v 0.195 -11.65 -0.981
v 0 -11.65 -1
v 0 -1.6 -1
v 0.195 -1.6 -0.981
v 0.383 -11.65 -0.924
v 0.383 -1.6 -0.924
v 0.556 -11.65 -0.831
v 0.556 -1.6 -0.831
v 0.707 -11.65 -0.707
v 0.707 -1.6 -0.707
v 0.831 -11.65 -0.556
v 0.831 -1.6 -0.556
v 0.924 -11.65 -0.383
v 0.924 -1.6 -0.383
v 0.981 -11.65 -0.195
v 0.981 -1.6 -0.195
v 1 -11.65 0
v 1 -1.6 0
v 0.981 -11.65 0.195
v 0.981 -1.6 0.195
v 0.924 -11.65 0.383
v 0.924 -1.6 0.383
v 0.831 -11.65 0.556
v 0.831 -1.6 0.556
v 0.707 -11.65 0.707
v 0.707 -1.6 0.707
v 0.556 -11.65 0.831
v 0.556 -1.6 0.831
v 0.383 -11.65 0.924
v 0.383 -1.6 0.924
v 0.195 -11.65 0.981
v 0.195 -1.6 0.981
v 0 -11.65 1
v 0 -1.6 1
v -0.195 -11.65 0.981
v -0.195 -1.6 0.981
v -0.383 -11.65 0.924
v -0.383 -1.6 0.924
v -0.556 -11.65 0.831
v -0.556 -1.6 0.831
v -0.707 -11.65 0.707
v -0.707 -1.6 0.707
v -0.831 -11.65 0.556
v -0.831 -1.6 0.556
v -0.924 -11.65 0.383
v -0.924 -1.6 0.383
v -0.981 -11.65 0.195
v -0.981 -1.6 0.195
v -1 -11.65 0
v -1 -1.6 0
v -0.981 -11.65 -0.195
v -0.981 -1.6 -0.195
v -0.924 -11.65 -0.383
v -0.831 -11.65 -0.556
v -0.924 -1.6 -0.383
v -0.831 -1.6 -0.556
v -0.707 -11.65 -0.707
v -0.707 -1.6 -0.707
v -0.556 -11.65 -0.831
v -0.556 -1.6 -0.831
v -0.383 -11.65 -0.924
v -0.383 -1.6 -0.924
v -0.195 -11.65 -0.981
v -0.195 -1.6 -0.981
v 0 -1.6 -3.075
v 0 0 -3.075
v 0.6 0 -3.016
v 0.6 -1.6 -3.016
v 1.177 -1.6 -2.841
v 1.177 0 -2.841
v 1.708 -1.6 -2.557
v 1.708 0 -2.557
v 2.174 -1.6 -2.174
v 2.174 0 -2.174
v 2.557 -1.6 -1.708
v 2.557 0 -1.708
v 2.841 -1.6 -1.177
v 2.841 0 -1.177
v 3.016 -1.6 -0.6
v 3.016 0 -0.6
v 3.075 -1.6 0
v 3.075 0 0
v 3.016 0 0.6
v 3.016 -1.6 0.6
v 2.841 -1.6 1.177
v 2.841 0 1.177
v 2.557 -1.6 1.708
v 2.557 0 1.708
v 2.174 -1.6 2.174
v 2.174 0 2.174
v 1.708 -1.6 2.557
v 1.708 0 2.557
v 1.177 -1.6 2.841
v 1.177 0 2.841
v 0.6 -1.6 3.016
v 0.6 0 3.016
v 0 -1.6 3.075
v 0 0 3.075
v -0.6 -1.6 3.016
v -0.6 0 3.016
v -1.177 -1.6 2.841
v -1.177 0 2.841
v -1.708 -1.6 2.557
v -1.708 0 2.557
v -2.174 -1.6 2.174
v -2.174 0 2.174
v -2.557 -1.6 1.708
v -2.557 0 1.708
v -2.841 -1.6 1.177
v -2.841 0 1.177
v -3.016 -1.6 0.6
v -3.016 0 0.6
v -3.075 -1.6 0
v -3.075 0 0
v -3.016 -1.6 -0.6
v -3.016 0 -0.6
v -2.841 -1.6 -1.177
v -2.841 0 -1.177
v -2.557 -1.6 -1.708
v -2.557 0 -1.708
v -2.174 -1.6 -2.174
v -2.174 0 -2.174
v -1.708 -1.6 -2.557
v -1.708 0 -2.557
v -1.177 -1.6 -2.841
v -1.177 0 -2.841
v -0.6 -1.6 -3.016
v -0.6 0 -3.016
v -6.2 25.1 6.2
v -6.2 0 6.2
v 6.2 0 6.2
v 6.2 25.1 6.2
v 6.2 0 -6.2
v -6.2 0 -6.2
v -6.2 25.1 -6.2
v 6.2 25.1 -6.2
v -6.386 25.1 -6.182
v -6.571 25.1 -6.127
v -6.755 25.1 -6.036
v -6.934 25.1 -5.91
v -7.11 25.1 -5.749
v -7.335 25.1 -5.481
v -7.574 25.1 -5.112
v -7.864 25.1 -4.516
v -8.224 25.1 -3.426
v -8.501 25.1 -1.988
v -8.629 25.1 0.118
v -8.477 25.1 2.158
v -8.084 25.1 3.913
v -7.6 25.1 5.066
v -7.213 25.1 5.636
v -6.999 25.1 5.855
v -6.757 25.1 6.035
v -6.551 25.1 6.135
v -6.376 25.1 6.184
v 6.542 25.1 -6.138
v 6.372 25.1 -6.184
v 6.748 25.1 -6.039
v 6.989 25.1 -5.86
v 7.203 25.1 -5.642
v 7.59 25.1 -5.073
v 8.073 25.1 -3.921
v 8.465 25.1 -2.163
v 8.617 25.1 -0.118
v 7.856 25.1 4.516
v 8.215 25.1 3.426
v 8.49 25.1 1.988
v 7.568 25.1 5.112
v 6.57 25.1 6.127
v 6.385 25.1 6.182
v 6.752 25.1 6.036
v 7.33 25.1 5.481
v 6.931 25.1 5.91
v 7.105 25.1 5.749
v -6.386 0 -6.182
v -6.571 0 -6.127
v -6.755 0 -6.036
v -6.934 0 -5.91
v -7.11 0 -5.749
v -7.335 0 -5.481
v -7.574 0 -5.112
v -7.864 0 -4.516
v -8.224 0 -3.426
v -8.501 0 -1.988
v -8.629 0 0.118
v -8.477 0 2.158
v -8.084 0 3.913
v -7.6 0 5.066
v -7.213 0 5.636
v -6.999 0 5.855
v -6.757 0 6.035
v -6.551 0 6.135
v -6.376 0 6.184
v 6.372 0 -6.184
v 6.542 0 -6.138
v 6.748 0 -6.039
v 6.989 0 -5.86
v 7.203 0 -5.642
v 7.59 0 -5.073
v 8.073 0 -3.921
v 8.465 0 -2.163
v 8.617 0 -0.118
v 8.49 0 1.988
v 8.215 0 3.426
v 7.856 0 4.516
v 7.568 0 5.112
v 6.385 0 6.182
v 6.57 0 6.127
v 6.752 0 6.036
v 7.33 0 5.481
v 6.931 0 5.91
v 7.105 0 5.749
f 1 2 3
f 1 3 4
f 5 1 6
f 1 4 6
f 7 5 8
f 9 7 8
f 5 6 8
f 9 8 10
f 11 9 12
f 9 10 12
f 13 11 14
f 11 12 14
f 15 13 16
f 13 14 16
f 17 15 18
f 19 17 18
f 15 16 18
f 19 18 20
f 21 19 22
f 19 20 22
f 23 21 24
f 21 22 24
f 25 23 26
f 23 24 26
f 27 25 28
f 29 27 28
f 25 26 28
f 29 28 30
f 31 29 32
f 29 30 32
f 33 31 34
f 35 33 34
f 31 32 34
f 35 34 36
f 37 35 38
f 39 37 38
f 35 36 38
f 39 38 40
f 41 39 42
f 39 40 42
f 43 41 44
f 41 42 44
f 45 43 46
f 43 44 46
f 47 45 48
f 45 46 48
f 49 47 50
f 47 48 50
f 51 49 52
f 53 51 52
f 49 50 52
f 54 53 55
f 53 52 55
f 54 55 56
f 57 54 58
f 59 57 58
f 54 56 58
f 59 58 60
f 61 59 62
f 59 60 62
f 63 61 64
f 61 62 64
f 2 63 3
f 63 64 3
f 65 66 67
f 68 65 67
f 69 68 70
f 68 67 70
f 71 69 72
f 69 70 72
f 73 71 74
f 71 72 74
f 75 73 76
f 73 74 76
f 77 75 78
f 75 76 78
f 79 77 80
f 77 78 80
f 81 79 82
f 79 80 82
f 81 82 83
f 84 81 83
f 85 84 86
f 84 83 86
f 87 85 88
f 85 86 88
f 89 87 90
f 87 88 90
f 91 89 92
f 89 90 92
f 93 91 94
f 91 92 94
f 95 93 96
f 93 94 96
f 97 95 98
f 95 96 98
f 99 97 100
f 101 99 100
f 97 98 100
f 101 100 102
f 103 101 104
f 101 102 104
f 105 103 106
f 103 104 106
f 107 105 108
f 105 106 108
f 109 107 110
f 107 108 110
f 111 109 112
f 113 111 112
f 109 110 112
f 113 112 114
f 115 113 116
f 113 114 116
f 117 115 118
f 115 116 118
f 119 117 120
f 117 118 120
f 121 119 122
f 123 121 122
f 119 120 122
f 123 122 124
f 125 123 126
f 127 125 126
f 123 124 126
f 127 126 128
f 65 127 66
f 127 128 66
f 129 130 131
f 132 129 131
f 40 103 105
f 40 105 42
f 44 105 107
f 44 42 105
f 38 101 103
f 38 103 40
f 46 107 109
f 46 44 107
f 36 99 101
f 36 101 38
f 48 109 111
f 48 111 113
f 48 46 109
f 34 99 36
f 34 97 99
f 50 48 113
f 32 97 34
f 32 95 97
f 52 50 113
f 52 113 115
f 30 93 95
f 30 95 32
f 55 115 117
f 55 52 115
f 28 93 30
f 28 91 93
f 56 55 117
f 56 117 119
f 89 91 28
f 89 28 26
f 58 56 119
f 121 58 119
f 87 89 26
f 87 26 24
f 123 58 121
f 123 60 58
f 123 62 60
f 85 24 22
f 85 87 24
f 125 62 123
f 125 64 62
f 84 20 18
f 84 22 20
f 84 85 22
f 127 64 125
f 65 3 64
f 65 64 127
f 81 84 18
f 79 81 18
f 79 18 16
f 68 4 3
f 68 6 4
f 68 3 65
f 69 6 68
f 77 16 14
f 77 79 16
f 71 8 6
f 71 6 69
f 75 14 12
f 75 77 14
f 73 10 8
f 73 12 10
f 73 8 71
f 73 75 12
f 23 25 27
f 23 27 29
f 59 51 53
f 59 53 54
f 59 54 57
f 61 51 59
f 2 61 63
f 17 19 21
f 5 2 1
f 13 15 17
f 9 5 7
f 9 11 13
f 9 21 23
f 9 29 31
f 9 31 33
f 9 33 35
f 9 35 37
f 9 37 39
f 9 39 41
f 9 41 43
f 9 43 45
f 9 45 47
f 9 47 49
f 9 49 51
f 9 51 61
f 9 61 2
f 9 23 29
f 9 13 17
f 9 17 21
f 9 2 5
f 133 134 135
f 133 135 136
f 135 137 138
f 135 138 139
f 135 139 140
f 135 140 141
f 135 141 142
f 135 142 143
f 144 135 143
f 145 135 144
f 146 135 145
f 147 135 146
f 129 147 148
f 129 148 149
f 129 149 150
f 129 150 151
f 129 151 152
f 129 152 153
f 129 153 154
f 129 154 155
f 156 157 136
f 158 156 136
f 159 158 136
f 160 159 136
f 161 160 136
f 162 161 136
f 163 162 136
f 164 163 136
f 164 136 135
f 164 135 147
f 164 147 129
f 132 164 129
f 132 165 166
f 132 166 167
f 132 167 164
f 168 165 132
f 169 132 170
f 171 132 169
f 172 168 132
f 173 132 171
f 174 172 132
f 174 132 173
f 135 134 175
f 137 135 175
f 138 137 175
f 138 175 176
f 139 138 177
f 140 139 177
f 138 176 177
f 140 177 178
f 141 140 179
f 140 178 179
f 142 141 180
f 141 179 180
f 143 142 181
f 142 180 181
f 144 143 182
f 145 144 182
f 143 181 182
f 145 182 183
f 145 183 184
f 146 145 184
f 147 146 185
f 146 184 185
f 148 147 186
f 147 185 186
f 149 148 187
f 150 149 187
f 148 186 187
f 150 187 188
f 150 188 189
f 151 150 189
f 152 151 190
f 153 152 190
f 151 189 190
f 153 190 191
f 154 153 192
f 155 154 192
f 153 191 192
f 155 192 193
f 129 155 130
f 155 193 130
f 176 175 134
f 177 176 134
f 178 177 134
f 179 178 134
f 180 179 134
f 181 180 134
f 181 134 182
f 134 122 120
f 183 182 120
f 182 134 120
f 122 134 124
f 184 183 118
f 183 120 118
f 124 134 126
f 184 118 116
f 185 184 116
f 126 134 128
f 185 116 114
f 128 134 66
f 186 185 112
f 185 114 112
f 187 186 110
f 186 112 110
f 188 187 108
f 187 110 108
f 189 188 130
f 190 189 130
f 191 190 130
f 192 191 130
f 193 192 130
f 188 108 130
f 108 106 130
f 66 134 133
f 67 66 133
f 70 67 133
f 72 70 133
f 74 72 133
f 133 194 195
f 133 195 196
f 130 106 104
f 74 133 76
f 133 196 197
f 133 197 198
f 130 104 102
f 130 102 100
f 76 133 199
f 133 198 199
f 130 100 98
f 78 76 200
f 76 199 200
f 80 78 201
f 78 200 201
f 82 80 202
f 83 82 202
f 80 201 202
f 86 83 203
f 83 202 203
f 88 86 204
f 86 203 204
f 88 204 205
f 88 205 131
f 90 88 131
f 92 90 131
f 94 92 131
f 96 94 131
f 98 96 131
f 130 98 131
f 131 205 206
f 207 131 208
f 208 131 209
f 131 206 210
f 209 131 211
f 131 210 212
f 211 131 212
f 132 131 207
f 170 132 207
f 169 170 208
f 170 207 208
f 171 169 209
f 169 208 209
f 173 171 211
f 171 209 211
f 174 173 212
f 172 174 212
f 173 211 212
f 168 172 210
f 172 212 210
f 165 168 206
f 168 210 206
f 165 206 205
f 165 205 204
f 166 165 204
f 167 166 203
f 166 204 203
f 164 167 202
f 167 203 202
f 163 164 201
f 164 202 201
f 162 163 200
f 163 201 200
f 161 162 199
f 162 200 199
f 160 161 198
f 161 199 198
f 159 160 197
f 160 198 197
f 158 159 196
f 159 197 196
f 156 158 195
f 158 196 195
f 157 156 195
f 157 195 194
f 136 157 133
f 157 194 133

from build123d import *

# Parameters (mm, degrees)
SKETCH2_RX          = 6.2
SKETCH2_RY          = 2.428962841
SKETCH2_RY_2        = 2.417240448
SKETCH2_W           = 12.4
SKETCH2_H           = 12.4
BOSS_EXTRUDE1_DEPTH = 25.1
SKETCH3_R           = 3.075
BOSS_EXTRUDE2_DEPTH = 1.6
SKETCH4_R           = 1
BOSS_EXTRUDE3_DEPTH = 10.05


with BuildPart() as part:
    # Sketch2 → Boss-Extrude1 (new body)
    with BuildSketch(Plane(origin=(0, 0, 0), x_dir=(1, 0, 0), z_dir=(0, 1, 0))):
        with Locations(Location((-6.2, 0), (0, 0, -90))):
            Ellipse(SKETCH2_RX, SKETCH2_RY)
        with Locations(Location((6.2, 0), (0, 0, -90))):
            Ellipse(SKETCH2_RX, SKETCH2_RY_2)
        Rectangle(SKETCH2_W, SKETCH2_H)
    extrude(amount=BOSS_EXTRUDE1_DEPTH)

    # Sketch3 → Boss-Extrude2 (add)
    with BuildSketch(Plane.XZ):
        with Locations(Location((0, 0, 0), (0, 0, 270))):
            Circle(SKETCH3_R)
    extrude(amount=BOSS_EXTRUDE2_DEPTH)

    # Sketch4 → Boss-Extrude3 (add)
    with BuildSketch(Plane.XZ.offset(1.6)):
        with Locations(Location((0, 0, 0), (0, 0, 270))):
            Circle(SKETCH4_R)
    extrude(amount=BOSS_EXTRUDE3_DEPTH)


solid = part.part
